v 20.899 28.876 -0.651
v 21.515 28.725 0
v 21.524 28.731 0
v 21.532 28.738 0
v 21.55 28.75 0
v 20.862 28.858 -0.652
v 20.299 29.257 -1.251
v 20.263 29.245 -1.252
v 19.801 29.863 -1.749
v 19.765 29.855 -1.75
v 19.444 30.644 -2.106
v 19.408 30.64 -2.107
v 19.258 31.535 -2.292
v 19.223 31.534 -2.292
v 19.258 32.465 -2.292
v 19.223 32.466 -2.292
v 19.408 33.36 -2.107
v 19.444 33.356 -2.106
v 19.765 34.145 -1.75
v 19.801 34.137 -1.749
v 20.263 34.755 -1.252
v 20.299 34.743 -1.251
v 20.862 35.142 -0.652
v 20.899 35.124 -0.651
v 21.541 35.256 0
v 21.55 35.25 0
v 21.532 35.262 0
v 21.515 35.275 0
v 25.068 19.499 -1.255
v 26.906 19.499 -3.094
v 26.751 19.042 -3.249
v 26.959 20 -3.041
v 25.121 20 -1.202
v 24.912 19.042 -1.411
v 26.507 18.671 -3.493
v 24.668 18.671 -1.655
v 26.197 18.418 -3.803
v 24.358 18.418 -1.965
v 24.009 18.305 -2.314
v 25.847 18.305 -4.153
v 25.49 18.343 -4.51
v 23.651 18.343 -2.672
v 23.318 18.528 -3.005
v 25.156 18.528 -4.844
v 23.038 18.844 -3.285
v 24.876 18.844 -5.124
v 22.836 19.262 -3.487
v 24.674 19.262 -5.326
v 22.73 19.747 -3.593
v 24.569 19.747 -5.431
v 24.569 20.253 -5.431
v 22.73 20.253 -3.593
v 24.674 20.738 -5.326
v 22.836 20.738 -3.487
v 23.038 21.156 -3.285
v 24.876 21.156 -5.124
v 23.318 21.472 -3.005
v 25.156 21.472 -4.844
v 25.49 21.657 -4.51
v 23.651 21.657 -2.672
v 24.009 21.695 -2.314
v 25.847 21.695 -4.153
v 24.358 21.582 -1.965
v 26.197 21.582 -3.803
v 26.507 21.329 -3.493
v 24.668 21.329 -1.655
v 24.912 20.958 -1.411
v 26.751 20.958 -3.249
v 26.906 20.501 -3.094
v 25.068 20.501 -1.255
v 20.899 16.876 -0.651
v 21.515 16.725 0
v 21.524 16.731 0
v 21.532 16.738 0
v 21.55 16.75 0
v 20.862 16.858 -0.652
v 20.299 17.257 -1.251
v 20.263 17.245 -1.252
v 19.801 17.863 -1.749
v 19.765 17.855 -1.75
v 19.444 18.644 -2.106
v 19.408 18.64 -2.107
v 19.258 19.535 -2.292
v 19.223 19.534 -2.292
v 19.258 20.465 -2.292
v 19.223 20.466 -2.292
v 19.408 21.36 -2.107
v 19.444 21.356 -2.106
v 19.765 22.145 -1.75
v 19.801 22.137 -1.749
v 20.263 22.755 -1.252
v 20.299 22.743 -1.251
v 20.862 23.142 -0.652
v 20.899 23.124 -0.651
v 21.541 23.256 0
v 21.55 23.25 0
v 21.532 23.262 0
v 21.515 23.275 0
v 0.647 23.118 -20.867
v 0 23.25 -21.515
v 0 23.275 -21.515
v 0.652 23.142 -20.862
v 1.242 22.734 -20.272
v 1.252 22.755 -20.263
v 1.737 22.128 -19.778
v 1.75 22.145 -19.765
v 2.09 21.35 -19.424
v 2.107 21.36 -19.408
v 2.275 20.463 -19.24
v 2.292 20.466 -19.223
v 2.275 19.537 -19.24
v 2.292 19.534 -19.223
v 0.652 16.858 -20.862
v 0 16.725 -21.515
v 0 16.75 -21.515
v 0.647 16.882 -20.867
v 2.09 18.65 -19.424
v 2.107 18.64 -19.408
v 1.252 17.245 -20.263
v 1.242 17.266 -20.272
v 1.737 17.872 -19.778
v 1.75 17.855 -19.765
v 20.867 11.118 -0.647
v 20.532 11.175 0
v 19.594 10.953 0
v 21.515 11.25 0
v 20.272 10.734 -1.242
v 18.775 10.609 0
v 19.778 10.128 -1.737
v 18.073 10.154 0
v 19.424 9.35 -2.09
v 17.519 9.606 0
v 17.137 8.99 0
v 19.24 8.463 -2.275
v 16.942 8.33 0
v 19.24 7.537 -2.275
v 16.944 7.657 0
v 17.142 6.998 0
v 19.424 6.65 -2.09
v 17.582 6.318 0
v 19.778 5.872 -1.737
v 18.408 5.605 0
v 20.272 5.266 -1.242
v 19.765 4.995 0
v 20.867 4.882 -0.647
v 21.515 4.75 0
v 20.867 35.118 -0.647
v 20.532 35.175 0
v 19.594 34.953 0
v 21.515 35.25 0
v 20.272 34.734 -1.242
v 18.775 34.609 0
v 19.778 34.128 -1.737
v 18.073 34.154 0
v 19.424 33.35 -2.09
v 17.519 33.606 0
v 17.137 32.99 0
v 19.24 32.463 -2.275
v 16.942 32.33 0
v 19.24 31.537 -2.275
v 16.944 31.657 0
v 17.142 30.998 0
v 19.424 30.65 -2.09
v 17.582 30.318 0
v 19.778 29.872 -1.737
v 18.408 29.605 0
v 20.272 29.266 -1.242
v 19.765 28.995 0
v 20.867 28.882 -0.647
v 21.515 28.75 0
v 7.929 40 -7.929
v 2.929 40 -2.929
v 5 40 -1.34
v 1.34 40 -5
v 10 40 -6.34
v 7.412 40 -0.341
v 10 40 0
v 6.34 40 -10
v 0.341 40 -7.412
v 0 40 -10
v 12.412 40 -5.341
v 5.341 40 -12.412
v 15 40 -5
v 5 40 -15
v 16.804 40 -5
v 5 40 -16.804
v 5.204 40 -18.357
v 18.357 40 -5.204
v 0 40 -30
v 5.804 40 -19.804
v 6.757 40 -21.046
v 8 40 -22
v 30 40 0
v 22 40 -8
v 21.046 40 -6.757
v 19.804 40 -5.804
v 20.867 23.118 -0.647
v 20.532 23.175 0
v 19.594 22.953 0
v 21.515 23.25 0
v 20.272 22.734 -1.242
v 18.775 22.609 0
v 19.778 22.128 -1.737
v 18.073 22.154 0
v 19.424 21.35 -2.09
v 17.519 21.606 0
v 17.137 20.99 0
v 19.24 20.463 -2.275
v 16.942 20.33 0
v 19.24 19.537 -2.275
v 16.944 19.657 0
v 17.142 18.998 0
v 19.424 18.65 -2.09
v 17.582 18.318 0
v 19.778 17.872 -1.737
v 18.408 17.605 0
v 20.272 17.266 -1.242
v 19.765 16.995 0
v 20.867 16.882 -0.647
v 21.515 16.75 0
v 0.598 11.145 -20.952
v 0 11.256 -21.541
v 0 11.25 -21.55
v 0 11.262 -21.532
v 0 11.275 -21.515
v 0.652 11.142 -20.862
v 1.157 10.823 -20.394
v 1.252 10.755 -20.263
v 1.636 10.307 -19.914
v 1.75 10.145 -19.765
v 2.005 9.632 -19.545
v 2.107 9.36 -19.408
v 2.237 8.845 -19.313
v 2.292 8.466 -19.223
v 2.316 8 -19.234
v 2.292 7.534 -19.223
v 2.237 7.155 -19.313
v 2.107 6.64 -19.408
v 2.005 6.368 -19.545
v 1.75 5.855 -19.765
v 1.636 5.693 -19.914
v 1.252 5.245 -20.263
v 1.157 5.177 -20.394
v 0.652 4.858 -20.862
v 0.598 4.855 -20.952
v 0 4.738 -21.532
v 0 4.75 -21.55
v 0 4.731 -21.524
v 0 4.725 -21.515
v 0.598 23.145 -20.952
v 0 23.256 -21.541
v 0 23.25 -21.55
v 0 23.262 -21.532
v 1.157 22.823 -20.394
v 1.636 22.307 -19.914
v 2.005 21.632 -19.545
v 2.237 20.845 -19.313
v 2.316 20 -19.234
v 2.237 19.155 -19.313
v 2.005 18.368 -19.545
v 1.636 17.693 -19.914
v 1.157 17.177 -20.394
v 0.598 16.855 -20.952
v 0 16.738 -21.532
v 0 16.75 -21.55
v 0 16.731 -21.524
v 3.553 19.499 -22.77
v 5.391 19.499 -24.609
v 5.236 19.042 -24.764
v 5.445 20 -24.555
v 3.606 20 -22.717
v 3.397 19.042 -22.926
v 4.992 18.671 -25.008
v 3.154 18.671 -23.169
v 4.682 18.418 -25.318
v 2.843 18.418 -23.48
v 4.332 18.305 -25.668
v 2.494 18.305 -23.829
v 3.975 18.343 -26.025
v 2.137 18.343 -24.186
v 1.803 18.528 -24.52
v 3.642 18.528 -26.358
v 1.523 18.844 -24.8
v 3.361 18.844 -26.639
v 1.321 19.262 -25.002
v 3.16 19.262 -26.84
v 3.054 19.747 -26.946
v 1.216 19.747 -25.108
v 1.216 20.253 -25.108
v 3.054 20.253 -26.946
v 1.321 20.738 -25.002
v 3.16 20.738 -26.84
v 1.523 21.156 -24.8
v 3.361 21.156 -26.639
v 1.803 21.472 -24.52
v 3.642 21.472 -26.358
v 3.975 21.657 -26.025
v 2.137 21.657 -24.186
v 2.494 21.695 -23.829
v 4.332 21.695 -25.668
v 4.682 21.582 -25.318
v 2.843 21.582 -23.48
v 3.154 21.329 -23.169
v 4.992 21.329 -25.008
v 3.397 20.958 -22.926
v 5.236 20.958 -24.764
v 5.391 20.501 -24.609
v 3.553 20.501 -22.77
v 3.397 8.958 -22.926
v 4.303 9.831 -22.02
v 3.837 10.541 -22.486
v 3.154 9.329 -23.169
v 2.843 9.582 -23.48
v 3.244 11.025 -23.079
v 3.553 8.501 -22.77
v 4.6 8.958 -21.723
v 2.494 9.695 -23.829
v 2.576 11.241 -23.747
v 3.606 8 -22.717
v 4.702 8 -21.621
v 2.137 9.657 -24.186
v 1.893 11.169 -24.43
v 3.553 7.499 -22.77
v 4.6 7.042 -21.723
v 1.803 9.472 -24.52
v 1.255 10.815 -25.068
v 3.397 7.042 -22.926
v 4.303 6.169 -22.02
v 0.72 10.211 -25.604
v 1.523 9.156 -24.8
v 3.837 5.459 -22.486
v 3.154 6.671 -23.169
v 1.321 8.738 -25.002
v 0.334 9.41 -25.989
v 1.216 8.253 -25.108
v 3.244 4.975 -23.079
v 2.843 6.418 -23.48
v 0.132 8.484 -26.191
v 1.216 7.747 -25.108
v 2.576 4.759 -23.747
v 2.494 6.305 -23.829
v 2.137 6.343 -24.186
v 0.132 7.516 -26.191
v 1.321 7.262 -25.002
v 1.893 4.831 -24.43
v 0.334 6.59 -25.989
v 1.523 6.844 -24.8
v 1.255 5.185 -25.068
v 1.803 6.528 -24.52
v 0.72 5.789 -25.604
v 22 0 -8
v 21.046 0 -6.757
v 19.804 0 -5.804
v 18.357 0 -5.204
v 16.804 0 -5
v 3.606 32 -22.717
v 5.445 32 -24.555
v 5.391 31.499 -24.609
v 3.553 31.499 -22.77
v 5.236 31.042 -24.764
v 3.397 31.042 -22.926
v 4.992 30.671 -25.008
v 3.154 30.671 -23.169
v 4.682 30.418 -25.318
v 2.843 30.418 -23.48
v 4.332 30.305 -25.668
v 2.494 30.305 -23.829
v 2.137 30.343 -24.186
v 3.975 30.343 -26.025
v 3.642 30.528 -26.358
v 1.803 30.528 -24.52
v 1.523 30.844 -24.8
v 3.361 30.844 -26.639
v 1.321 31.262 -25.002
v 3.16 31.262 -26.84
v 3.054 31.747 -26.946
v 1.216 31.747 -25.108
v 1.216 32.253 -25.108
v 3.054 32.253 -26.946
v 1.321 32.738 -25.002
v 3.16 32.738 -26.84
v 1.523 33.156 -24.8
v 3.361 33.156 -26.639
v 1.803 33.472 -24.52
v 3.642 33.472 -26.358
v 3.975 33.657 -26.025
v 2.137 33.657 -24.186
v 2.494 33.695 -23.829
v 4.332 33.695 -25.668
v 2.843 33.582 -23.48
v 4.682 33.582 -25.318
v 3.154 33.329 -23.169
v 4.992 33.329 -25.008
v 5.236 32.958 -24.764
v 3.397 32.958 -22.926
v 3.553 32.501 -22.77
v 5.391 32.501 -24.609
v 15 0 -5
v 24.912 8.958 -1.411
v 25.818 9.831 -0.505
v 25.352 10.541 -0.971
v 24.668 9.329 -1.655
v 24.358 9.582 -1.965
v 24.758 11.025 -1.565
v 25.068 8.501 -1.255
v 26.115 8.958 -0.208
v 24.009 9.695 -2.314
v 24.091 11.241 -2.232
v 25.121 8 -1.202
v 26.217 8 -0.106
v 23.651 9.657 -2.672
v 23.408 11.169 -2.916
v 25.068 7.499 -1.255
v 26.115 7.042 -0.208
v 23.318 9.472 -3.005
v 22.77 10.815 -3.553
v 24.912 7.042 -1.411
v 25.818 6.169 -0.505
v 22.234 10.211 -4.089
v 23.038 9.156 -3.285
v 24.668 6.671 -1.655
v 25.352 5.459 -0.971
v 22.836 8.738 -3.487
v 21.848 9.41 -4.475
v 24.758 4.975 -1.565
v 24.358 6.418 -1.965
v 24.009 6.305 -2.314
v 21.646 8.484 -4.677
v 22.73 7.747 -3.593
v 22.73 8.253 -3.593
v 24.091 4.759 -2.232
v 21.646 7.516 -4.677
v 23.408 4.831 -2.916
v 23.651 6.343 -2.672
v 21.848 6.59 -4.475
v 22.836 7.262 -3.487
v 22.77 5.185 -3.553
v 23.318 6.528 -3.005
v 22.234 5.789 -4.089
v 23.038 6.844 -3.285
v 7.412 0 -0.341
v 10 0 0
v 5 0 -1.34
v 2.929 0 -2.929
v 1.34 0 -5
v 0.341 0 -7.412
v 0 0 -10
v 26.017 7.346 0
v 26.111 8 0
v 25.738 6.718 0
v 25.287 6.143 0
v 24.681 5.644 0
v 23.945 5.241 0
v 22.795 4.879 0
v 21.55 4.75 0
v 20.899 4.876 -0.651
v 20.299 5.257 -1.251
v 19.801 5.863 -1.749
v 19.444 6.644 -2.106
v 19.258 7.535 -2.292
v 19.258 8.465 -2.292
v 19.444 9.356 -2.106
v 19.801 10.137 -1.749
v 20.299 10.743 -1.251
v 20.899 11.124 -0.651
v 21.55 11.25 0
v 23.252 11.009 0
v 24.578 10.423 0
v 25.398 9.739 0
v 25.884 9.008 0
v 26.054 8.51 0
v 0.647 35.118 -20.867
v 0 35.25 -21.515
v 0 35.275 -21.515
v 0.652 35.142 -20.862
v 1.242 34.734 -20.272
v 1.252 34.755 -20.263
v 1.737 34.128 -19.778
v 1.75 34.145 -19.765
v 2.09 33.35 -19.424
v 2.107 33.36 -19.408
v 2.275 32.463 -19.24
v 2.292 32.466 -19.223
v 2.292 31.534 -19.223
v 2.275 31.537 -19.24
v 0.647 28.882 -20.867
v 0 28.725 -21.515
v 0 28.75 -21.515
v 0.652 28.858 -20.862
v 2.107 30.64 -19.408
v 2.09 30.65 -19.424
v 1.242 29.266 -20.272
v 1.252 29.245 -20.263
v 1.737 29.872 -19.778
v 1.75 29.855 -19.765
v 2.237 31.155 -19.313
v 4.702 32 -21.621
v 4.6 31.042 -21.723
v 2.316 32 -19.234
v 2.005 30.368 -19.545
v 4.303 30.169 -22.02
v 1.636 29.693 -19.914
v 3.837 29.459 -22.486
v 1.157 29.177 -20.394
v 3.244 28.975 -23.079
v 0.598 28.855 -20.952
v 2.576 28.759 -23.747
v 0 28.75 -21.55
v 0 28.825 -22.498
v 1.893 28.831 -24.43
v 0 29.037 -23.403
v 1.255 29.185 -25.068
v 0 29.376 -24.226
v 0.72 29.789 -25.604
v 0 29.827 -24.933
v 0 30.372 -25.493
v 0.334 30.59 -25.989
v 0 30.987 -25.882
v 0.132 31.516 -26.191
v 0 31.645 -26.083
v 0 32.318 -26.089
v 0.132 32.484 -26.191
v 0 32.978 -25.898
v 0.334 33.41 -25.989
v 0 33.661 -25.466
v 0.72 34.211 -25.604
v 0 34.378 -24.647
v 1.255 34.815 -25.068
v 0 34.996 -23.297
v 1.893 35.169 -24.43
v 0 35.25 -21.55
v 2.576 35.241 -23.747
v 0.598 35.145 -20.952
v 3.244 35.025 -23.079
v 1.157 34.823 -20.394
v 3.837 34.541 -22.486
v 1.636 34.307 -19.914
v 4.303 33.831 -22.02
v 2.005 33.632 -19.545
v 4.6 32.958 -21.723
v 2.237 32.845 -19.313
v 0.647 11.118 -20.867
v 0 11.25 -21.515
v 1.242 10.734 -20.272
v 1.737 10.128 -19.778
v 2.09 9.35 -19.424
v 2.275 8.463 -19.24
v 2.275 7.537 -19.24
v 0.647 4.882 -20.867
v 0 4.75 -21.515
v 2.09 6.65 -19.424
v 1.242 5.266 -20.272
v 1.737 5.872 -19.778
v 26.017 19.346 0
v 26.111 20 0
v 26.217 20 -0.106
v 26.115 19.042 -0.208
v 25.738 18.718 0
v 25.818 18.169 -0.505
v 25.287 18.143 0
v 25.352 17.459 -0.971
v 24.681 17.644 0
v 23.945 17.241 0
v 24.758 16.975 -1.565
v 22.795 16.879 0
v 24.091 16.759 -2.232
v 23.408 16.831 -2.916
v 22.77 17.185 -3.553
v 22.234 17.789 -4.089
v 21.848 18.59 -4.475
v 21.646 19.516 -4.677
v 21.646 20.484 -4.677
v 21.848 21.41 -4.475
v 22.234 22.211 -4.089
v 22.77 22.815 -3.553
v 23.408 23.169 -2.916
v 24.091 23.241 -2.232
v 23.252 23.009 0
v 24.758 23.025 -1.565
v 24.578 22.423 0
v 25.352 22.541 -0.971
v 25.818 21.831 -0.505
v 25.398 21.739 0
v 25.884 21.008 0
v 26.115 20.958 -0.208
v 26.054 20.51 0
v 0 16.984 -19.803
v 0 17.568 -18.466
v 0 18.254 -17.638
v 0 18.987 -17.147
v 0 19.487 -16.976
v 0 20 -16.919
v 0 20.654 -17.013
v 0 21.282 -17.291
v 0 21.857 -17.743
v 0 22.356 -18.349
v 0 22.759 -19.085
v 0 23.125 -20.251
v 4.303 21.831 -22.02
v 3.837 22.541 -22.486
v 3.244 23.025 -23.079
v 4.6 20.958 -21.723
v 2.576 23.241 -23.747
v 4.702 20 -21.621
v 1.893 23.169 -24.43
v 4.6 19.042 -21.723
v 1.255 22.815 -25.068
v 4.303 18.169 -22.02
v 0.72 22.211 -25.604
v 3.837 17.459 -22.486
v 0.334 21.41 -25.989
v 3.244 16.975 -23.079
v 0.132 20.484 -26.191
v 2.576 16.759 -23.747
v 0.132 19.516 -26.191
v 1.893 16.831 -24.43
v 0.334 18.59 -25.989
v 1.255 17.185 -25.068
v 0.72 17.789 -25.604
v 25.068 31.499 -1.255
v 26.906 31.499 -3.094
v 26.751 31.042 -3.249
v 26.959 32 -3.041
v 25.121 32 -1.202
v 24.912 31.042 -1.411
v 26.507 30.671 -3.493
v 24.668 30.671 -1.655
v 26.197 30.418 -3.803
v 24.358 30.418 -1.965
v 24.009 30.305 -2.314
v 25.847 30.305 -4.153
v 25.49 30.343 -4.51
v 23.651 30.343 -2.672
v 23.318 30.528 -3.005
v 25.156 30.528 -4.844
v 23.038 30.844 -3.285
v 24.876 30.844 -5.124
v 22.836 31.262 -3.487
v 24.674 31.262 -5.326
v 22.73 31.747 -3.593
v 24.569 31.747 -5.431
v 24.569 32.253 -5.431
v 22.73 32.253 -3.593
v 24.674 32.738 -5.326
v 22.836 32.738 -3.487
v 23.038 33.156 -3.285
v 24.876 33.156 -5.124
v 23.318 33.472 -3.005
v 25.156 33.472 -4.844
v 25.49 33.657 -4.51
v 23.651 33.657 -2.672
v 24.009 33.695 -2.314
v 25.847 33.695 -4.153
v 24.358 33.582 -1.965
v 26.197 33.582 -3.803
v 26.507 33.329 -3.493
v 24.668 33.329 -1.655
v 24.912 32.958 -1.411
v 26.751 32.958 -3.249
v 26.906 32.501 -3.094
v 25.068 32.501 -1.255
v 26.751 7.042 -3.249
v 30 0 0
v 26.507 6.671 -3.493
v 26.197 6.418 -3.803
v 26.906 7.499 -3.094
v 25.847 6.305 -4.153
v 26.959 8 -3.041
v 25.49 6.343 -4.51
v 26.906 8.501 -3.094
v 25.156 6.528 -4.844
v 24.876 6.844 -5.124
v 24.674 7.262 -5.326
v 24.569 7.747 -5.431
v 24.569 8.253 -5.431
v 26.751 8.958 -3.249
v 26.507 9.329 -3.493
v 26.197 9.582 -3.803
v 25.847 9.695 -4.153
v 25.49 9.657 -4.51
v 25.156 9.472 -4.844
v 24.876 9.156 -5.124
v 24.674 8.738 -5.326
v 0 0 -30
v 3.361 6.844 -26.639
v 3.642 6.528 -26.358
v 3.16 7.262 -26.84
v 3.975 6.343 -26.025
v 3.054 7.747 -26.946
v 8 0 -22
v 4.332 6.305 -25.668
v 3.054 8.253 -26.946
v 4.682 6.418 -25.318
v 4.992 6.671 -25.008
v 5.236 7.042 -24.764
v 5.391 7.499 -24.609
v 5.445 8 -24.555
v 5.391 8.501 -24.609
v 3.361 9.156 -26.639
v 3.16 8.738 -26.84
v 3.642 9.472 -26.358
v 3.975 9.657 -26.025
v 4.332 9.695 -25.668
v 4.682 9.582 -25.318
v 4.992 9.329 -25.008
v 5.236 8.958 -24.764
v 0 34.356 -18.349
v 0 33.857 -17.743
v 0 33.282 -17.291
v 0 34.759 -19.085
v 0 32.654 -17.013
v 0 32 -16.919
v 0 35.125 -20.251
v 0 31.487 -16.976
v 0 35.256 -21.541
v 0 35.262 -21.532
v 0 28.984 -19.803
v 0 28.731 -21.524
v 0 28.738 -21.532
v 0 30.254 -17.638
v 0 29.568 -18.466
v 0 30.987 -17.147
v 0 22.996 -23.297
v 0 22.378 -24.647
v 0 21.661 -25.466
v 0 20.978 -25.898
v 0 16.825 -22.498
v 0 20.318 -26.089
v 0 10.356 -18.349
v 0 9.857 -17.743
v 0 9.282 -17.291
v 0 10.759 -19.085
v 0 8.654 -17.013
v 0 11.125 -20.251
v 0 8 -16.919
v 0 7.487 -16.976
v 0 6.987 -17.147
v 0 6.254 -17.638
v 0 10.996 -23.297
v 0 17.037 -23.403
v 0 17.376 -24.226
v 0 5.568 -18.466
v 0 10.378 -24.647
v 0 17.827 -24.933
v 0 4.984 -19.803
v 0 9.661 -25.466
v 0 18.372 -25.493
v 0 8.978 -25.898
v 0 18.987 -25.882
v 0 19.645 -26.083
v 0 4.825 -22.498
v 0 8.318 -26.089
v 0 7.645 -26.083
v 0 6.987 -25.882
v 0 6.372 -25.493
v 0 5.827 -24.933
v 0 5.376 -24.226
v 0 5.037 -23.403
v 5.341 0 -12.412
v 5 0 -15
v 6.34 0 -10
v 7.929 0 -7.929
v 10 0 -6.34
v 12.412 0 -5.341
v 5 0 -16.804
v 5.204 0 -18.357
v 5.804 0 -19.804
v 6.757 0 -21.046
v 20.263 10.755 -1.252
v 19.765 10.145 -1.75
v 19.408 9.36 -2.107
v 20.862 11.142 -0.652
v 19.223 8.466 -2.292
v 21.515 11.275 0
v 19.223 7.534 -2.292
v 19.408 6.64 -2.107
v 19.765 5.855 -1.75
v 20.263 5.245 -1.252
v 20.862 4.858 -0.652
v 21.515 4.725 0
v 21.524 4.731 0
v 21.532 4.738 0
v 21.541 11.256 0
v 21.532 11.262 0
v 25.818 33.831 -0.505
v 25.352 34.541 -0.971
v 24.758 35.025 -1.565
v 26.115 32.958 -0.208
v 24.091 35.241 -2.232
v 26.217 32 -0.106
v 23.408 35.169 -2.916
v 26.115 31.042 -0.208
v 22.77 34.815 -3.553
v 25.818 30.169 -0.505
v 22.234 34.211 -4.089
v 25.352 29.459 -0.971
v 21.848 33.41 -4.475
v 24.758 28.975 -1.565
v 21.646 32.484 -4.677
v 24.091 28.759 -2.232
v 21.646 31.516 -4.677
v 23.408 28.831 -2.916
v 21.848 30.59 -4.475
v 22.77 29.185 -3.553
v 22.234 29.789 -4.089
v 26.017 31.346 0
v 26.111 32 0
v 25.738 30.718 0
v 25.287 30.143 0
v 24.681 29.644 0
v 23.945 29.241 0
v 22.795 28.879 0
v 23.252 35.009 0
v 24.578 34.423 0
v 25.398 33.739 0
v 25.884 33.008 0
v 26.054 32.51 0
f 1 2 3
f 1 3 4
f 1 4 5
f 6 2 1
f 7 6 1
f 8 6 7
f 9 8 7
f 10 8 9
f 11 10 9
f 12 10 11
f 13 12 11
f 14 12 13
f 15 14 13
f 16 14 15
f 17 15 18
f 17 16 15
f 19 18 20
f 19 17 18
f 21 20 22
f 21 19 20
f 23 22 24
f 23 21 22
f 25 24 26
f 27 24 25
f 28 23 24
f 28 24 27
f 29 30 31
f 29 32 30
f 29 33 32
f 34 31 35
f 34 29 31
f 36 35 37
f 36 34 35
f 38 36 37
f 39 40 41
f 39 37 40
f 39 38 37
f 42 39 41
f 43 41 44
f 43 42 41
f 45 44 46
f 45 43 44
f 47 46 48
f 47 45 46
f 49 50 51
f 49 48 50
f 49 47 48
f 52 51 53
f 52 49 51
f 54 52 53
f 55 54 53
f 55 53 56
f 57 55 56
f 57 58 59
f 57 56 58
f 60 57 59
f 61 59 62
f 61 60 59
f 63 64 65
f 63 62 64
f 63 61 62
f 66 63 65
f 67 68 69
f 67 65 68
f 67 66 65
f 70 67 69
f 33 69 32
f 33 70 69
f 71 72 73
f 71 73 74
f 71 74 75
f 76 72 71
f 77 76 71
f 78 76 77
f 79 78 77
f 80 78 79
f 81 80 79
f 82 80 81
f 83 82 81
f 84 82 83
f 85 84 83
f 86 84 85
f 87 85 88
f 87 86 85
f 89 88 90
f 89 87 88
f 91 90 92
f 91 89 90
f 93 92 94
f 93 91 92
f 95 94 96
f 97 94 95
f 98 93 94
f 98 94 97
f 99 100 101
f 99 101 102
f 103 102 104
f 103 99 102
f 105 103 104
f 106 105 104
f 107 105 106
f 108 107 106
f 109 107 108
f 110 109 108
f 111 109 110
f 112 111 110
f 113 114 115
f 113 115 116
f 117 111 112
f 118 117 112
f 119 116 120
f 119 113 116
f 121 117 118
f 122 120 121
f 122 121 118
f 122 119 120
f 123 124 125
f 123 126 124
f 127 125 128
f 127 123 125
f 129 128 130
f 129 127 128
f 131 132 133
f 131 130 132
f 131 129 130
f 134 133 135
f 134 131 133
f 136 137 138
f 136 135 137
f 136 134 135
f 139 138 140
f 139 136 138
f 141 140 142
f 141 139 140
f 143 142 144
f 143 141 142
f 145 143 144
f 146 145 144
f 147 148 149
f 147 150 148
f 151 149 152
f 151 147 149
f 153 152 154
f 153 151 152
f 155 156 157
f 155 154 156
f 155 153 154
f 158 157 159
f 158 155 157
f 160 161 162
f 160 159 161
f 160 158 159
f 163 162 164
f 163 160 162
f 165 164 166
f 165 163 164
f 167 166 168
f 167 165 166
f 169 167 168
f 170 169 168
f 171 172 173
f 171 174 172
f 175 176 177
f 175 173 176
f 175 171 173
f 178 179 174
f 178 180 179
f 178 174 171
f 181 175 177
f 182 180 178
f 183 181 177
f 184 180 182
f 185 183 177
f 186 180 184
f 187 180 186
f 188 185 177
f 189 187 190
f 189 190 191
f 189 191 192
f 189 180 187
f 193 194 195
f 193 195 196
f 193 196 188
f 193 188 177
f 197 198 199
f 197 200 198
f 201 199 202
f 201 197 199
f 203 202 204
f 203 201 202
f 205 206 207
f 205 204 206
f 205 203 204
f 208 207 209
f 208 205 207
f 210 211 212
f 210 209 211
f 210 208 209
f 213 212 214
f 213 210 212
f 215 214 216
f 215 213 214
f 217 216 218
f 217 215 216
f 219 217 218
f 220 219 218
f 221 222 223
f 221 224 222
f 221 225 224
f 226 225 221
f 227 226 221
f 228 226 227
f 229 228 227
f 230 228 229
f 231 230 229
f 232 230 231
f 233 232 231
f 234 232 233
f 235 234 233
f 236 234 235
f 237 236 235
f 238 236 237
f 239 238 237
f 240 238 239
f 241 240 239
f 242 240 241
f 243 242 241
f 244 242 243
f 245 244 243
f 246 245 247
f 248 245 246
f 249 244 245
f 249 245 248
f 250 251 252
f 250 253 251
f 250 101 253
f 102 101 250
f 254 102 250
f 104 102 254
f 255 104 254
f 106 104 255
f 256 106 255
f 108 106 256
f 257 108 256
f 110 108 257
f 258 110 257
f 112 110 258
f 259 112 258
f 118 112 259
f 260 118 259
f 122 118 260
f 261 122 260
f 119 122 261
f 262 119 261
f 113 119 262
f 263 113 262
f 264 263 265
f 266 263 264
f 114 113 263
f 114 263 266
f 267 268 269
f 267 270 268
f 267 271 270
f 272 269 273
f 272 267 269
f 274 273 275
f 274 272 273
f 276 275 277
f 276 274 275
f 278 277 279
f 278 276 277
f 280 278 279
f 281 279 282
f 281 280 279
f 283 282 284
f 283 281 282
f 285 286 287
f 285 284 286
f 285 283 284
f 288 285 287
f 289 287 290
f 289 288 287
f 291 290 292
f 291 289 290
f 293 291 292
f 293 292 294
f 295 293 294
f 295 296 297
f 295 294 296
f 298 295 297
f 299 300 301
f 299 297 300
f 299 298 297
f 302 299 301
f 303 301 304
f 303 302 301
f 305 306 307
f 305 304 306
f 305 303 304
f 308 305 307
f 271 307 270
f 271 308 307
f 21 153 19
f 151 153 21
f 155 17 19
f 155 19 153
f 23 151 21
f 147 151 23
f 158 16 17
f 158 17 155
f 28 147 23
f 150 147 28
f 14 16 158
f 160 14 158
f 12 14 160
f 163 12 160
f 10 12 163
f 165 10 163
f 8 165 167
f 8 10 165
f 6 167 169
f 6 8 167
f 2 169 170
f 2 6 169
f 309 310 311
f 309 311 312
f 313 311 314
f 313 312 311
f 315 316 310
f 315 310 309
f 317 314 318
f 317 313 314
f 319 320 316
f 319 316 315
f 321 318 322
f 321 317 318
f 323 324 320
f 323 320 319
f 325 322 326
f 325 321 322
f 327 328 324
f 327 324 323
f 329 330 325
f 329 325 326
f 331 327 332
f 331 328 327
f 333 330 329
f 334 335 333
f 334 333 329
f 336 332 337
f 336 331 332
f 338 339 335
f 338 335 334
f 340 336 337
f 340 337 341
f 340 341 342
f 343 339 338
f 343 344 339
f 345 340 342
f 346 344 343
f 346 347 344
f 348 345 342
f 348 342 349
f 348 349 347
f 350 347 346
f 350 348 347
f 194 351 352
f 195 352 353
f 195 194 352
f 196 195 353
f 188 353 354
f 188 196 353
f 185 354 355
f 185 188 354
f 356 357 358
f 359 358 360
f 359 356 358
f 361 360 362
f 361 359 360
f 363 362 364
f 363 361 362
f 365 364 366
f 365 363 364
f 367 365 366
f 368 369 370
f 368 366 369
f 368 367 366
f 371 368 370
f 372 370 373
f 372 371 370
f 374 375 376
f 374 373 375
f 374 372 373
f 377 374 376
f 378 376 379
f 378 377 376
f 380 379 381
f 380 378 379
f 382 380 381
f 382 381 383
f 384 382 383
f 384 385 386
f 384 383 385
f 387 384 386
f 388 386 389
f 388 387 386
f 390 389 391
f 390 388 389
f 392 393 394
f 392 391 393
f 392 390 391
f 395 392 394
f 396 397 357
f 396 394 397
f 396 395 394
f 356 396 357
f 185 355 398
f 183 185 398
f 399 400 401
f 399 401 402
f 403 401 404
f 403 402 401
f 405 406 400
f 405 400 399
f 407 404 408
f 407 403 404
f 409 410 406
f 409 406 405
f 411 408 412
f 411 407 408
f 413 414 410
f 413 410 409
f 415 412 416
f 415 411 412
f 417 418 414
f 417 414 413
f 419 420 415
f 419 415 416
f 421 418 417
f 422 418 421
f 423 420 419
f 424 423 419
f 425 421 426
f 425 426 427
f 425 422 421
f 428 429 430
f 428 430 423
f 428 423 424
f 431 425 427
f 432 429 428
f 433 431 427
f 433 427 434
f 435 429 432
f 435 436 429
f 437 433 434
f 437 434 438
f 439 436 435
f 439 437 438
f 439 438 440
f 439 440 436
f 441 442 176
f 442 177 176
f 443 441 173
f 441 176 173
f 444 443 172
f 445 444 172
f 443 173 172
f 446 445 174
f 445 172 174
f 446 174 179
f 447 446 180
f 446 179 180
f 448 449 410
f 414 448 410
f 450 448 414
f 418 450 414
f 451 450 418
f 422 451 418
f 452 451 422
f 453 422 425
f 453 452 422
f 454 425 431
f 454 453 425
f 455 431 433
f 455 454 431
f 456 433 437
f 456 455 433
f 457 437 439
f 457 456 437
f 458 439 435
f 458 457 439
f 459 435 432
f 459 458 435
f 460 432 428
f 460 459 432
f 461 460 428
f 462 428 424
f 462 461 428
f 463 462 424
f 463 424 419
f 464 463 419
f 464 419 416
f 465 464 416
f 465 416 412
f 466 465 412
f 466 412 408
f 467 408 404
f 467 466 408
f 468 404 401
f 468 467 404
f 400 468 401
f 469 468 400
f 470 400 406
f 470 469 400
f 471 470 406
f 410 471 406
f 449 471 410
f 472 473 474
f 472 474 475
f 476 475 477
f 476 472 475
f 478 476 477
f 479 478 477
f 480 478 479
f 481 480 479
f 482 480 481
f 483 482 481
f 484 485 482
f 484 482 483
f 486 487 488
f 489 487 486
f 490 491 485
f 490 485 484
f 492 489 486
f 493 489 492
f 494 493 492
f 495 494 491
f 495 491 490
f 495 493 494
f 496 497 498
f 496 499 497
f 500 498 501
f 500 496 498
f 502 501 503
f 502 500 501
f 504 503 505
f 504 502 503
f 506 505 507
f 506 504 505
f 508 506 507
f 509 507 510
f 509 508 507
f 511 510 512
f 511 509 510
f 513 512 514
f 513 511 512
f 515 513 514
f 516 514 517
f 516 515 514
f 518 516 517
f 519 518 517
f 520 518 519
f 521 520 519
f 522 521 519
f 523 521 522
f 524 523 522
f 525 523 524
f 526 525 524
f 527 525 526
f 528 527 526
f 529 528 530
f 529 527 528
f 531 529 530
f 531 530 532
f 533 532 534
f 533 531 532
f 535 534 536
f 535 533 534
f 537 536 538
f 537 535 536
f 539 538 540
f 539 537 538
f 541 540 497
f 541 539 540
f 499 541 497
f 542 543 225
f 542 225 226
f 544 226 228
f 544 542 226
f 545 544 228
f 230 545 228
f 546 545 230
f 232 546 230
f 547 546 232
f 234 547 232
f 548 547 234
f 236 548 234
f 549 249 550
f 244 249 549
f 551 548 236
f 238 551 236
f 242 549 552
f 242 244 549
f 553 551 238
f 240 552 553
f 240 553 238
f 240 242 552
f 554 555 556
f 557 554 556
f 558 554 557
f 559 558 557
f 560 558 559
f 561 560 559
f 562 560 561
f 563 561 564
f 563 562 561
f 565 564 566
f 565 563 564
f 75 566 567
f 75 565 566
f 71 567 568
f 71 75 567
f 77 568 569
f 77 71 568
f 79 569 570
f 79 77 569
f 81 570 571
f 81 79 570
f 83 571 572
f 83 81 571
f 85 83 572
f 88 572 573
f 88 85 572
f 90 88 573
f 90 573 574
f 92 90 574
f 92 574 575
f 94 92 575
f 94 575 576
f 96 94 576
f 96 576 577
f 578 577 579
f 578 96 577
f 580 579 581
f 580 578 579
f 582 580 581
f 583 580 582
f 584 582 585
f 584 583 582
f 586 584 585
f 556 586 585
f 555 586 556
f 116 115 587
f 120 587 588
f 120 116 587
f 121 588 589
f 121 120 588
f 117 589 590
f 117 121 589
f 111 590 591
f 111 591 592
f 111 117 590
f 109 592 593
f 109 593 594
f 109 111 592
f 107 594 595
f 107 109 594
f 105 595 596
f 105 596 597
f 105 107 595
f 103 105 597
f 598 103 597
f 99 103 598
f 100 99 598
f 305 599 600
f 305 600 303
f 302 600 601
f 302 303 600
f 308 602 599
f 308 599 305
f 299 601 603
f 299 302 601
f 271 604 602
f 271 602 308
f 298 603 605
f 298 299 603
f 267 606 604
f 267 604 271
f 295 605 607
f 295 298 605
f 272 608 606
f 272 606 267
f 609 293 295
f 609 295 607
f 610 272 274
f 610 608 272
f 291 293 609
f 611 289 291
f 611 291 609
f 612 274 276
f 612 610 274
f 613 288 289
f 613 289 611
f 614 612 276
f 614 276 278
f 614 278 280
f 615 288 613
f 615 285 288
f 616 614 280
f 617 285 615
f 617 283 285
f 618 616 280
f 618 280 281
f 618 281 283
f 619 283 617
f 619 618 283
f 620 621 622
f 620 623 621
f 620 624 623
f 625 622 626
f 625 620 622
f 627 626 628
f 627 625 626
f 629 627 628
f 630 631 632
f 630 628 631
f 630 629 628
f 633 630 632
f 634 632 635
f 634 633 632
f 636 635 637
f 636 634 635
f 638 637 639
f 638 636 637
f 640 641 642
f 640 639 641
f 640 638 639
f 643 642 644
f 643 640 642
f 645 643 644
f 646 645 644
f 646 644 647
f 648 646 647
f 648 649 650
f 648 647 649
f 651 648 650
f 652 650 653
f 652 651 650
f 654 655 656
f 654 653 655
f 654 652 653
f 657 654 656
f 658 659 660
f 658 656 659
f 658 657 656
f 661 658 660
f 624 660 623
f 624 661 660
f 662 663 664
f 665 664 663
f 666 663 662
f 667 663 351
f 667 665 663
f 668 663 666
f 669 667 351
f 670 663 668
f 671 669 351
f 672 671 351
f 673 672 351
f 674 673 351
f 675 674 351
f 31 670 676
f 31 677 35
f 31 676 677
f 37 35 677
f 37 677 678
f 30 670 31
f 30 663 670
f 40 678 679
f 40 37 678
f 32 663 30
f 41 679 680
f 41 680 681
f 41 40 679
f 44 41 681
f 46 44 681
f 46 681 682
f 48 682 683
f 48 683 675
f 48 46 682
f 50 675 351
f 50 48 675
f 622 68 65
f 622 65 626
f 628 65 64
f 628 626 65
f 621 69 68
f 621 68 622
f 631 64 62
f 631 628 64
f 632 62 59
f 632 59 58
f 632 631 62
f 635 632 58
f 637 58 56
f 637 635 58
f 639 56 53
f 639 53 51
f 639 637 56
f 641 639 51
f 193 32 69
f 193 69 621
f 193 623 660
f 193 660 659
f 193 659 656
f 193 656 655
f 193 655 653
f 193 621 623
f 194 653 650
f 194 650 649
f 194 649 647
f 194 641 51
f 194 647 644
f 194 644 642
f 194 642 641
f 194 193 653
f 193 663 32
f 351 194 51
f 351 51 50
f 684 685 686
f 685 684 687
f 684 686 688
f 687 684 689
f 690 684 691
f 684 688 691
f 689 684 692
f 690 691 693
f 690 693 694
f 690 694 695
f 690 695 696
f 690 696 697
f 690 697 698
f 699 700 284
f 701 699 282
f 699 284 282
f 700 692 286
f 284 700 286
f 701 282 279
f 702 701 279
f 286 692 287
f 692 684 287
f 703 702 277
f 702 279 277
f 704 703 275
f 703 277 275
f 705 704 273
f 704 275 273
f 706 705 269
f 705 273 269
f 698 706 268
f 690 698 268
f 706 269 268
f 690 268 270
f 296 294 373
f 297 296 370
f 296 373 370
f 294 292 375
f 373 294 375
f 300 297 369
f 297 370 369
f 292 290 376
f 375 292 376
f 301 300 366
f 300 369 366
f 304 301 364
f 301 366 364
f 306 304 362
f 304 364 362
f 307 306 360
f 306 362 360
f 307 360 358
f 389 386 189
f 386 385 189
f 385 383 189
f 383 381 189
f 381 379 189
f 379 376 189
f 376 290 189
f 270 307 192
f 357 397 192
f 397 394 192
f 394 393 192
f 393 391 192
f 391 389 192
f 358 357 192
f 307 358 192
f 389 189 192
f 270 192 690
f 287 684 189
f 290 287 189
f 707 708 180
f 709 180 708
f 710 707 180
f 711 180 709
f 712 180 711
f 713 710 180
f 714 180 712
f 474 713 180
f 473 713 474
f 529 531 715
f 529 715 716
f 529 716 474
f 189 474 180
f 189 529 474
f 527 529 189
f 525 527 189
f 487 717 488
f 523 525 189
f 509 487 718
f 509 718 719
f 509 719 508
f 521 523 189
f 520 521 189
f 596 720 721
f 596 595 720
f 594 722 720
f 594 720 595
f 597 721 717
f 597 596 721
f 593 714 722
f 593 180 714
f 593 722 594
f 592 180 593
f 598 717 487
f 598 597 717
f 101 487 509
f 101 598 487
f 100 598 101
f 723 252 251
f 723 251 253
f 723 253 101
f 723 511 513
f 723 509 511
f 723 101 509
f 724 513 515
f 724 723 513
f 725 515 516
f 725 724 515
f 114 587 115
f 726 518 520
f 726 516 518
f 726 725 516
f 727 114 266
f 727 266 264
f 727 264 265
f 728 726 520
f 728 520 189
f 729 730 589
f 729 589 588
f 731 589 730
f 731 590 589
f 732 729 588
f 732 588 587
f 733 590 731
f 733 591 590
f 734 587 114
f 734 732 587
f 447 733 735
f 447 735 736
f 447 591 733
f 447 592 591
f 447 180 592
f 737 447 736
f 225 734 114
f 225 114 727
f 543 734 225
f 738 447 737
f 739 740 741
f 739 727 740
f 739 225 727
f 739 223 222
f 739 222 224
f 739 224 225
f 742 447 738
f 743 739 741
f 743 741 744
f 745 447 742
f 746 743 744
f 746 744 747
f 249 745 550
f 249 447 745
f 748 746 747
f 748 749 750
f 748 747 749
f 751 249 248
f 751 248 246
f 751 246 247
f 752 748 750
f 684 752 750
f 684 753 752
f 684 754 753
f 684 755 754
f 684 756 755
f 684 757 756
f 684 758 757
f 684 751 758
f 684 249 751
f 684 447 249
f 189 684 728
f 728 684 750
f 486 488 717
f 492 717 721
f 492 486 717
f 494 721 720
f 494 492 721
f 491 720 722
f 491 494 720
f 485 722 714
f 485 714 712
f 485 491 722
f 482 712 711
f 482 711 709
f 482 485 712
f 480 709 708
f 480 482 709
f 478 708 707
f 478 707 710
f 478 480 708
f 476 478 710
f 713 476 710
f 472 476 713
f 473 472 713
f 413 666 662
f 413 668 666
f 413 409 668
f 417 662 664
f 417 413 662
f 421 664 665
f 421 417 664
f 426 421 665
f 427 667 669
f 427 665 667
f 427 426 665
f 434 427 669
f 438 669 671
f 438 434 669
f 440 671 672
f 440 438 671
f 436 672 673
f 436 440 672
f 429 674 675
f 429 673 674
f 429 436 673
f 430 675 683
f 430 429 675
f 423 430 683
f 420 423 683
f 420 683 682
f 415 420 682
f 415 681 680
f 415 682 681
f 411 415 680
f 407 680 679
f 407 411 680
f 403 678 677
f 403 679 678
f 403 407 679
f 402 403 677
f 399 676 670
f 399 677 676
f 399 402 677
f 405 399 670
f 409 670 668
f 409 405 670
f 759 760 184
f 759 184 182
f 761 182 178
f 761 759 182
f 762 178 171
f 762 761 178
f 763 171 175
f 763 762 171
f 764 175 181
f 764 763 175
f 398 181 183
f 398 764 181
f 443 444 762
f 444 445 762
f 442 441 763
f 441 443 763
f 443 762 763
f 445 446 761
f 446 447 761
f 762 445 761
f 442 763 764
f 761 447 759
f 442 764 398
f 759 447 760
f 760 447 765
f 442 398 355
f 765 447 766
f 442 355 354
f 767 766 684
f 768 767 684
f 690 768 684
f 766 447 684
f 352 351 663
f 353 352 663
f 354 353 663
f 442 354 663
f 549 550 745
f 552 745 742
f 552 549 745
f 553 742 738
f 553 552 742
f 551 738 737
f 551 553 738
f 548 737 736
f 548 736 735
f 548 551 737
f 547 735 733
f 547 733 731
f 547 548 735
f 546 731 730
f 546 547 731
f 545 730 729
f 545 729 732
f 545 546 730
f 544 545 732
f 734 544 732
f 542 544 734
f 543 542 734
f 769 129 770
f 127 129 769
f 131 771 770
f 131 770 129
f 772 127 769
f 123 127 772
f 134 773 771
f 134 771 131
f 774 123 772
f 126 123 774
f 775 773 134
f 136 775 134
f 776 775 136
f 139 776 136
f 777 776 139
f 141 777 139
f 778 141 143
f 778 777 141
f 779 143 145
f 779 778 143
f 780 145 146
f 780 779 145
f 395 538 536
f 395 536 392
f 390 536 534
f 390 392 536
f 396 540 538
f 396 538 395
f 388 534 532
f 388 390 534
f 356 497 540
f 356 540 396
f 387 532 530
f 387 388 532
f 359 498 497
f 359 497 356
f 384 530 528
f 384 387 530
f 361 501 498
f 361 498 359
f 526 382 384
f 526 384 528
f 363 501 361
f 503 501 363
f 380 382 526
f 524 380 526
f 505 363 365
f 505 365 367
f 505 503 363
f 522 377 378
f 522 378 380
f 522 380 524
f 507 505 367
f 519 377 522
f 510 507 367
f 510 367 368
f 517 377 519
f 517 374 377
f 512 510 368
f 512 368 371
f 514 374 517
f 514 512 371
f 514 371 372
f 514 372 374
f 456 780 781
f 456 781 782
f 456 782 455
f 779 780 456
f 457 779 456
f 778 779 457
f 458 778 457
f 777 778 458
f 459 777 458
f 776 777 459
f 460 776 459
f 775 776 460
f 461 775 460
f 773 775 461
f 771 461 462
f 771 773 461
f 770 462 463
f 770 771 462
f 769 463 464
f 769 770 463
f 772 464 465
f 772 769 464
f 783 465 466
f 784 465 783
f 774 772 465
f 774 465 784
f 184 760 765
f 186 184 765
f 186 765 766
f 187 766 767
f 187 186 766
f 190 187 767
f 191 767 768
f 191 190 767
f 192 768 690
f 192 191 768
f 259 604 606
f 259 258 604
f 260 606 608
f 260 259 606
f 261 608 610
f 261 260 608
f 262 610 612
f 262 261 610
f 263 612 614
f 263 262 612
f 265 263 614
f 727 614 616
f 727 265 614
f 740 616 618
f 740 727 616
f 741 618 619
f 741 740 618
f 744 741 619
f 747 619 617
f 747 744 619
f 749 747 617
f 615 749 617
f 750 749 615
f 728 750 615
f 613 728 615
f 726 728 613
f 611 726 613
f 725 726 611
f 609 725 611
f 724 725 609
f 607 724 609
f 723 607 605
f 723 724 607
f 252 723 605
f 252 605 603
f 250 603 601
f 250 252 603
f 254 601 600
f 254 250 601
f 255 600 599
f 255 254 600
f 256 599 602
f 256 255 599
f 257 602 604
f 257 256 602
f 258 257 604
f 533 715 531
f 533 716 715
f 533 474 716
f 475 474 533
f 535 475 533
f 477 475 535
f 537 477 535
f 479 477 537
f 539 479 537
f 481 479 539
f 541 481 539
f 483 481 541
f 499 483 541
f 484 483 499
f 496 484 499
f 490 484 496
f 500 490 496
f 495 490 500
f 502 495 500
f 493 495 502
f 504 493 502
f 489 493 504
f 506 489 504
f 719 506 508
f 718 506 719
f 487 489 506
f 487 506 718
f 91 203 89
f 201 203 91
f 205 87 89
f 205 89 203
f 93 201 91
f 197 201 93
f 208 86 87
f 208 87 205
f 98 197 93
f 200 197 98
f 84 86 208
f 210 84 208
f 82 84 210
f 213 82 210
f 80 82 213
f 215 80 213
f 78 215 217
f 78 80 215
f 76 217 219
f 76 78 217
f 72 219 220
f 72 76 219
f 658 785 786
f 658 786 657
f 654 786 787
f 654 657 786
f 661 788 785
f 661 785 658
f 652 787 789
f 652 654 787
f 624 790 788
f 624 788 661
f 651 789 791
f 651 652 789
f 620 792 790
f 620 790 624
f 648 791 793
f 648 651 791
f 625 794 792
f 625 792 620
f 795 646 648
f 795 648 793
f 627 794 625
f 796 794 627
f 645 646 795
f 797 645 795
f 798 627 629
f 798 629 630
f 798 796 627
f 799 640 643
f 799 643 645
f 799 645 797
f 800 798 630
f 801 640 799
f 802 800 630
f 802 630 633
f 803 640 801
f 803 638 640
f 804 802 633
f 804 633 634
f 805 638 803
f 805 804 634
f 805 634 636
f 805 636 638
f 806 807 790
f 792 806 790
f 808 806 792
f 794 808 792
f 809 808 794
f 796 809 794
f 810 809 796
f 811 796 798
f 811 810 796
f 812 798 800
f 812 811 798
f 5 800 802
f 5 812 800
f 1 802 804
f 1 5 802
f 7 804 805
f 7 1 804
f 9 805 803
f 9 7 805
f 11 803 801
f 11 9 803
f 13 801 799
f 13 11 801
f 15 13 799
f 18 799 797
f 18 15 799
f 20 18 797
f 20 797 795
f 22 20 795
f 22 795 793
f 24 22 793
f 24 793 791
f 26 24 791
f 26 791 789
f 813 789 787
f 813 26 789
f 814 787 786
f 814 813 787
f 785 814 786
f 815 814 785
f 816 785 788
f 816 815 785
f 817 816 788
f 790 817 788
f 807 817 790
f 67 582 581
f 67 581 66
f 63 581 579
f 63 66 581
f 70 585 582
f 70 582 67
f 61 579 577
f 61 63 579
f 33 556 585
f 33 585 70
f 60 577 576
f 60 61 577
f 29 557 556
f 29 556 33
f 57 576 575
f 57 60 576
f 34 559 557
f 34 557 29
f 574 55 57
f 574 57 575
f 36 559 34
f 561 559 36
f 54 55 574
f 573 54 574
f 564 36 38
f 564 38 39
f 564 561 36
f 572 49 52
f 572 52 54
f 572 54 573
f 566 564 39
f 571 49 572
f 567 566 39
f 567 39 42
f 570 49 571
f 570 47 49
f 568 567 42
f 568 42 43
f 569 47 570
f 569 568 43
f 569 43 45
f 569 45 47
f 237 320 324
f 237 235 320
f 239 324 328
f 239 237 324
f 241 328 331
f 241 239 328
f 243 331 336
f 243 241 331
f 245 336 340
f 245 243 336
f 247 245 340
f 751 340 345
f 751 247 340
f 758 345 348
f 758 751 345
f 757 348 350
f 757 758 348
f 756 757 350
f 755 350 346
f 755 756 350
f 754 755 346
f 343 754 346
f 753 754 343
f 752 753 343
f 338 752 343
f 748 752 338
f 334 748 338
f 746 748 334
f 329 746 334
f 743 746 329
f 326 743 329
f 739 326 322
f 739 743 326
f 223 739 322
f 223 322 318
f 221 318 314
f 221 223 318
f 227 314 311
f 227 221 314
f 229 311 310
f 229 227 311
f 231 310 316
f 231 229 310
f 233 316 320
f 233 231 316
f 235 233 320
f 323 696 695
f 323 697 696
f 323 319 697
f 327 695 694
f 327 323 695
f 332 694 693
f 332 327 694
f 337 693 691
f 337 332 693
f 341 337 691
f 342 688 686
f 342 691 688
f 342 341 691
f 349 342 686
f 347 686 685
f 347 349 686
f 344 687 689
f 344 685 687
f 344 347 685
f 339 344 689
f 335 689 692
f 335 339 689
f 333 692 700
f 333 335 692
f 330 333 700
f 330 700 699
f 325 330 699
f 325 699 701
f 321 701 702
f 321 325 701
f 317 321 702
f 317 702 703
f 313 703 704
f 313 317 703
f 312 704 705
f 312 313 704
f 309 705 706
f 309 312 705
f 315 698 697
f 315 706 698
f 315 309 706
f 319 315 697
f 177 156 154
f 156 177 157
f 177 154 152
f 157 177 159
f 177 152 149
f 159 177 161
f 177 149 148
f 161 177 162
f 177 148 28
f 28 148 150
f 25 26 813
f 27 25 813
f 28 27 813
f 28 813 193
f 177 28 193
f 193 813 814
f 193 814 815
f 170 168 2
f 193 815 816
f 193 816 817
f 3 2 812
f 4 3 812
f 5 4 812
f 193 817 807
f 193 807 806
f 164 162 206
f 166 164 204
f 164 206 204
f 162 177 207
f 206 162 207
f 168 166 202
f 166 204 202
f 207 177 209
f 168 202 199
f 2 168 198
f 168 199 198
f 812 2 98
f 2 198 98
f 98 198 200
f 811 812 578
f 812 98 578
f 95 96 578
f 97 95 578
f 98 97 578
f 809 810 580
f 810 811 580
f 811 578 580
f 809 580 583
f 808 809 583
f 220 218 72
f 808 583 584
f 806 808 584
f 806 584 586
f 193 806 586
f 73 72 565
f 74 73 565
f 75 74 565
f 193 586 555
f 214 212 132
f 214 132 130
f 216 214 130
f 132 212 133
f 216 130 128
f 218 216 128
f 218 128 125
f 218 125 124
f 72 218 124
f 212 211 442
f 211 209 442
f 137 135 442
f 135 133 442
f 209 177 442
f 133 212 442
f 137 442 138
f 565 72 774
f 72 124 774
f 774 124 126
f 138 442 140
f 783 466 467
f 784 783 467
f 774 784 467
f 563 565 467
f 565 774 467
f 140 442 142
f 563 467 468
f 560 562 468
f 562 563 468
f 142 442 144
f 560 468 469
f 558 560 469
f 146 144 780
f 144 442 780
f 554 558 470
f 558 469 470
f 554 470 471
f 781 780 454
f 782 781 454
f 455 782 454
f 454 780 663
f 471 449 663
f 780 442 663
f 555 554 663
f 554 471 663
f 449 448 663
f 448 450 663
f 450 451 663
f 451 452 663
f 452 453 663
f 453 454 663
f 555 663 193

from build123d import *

# Parameters (mm, degrees)
SKETCH1_W                                    = 30
SKETCH1_H                                    = 30
SKETCH1_R                                    = 10
BOSS_EXTRUDE1_DEPTH                          = 40
CUT_EXTRUDE1_DEPTH                           = 59.309518948
CUT_EXTRUDE2_DEPTH                           = 59.309518948
BOSS_EXTRUDE2_DEPTH                          = 40
FILLET1_R                                    = 6
M3_CLEARANCE_HOLE1_D                         = 3.2
M3_CLEARANCE_HOLE1_CSINK_D                   = 3.25
M3_CLEARANCE_HOLE1_CSINK_ANGLE               = 90
CBORE_FOR_M3_HEX_SOCKET_HEAD_CAP_SCR_2_COUNT = 2
CBORE_FOR_M3_HEX_SOCKET_HEAD_CAP_SCR_2_PITCH = 12
CBORE_FOR_M3_HEX_SOCKET_HEAD_CAP_SCR_3_COUNT = 2
CBORE_FOR_M3_HEX_SOCKET_HEAD_CAP_SCR_3_PITCH = 24
CBORE_FOR_M3_HEX_SOCKET_HEAD_CAP_SCR_4_COUNT = 2
CBORE_FOR_M3_HEX_SOCKET_HEAD_CAP_SCR_4_PITCH = 30.426406871
CBORE_FOR_M3_HEX_SOCKET_HEAD_CAP_SCR_5_COUNT = 2
CBORE_FOR_M3_HEX_SOCKET_HEAD_CAP_SCR_5_PITCH = 32.707281072
CBORE_FOR_M3_HEX_SOCKET_HEAD_CAP_SCR_6_COUNT = 2
CBORE_FOR_M3_HEX_SOCKET_HEAD_CAP_SCR_6_PITCH = 38.752628751
SKETCH10_R                                   = 3.25
CUT_EXTRUDE3_DEPTH                           = 47.55178469
FILLET2_R                                    = 10


with BuildPart() as part:
    # Sketch1 → Boss-Extrude1 (new body)
    with BuildSketch(Plane(origin=(0, 0, 0), x_dir=(1, 0, 0), z_dir=(0, 1, 0))):
        with Locations((15, 15)):
            Rectangle(SKETCH1_W, SKETCH1_H)
        with Locations(Location((15, 15, 0), (0, 0, 270))):
            Circle(SKETCH1_R, mode=Mode.SUBTRACT)
    extrude(amount=BOSS_EXTRUDE1_DEPTH)

    # Sketch2 → Cut-Extrude1 (cut, through all)
    with BuildSketch(Plane(origin=(0, 40, 0), x_dir=(1, 0, 0), z_dir=(0, 1, 0))):
        with BuildLine():
            Line((5, 15), (5, 30))
            Line((5, 30), (30, 30))
            Line((30, 30), (30, 5))
            Line((30, 5), (15, 5))
            ThreePointArc((15, 5), (7.928932188, 7.928932188), (5, 15))
        make_face()
    extrude(amount=-CUT_EXTRUDE1_DEPTH, mode=Mode.SUBTRACT)

    # Sketch3 → Cut-Extrude2 (cut, through all)
    with BuildSketch(Plane(origin=(0, 40, 0), x_dir=(1, 0, 0), z_dir=(0, 1, 0))):
        Polygon((0, 30), (5, 25), (5, 30), align=None)
        Polygon((30, 0), (25, 5), (30, 5), align=None)
    extrude(amount=-CUT_EXTRUDE2_DEPTH, mode=Mode.SUBTRACT)

    # Sketch7 → Boss-Extrude2 (add)
    with BuildSketch(Plane(origin=(0, 40, 0), x_dir=(1, 0, 0), z_dir=(0, 1, 0))):
        Polygon((5, 25), (8, 22), (5, 22), align=None)
        Polygon((25, 5), (22, 8), (22, 5), align=None)
    extrude(amount=-BOSS_EXTRUDE2_DEPTH)

    # Fillet1
    # the kernel refuses this fillet: 6 mm, written as the material it adds along each edge
    with BuildSketch(Plane(origin=(5, 40, -22), x_dir=(1, 0, 0), z_dir=(0, -1, 0))) as fillet1_piece_1_section:
        with BuildLine():
            CenterArc((6, 5.196152423), FILLET1_R, 180, 60)
            Line((0, 5.196152423), (-0.12, 5.196152423))
            Line((-0.12, 5.196152423), (-0.12, 0))
            Line((-0.12, 0), (0, -0.12))
            ThreePointArc((0, -0.12), (1.5, -0.12), (2.94, -0.103923048))
            Line((2.94, -0.103923048), (3, 0))
        make_face()
    fillet1_piece_1 = extrude(amount=40, mode=Mode.PRIVATE)
    fillet1_piece_1 = split(fillet1_piece_1, bisect_by=Plane(origin=(7.537314478, 20, -22.462685522), z_dir=(-0.7071067811865479, 0, 0.7071067811865474)), keep=Keep.TOP, mode=Mode.PRIVATE)
    add(fillet1_piece_1)
    with BuildSketch(Plane(origin=(22, 40, -5), x_dir=(-1, 0, 0), z_dir=(0, -1, 0))) as fillet1_piece_2_section:
        with BuildLine():
            CenterArc((5.196152423, 6), FILLET1_R, 210, 60)
            Line((0, 3), (-0.103923048, 2.94))
            ThreePointArc((-0.103923048, 2.94), (-0.12, 1.5), (-0.12, 0))
            Line((-0.12, 0), (0, -0.12))
            Line((0, -0.12), (5.196152423, -0.12))
            Line((5.196152423, -0.12), (5.196152423, 0))
        make_face()
    fillet1_piece_2 = extrude(amount=40, mode=Mode.PRIVATE)
    fillet1_piece_2 = split(fillet1_piece_2, bisect_by=Plane(origin=(22.462685522, 20, -7.537314478), z_dir=(-0.7071067811865436, 0, 0.7071067811865516)), keep=Keep.TOP, mode=Mode.PRIVATE)
    add(fillet1_piece_2)

    # M3 Clearance Hole1 (through all)
    with Locations(Plane(origin=(15, 0, -15), x_dir=(-0.7071067811865475, 0, -0.7071067811865476), z_dir=(0.7071067811865476, 0, -0.7071067811865475))):
        with Locations((-15.213203436, 32), (15.213203436, 32), (15.213203436, 20), (15.213203436, 8), (-15.213203436, 8), (-15.213203436, 20)):
            CounterSinkHole(M3_CLEARANCE_HOLE1_D / 2, M3_CLEARANCE_HOLE1_CSINK_D / 2, counter_sink_angle=M3_CLEARANCE_HOLE1_CSINK_ANGLE)

    # Sketch9 → CBORE for M3 Hex Socket Head Cap Screw1 (revolve, cut)
    with BuildSketch(Plane(origin=(21.514718626, 32, 0), x_dir=(0.7071067811865515, 0, 0.7071067811865436), z_dir=(0, 1, 0))):
        Polygon((0, 0), (0, 27.213203436), (1.7, 27.213203436), (1.7, 3.4), (3.25, 3.4), (3.25, 0.025), (3.275, 0), align=None)
    cbore_for_m3_hex_socket_head_cap_screw1 = revolve(axis=Axis((17.024590565, 32, 4.490128061), (0.7071067811865436, 0, -0.7071067811865515)), mode=Mode.SUBTRACT)

    # CBORE for M3 Hex Socket Head Cap Scr 2: CBORE for M3 Hex Socket Head Cap Screw1 ×2
    with Locations(*[(0, -i * CBORE_FOR_M3_HEX_SOCKET_HEAD_CAP_SCR_2_PITCH, 0) for i in range(1, CBORE_FOR_M3_HEX_SOCKET_HEAD_CAP_SCR_2_COUNT)]):
        add(cbore_for_m3_hex_socket_head_cap_screw1, mode=Mode.SUBTRACT)

    # CBORE for M3 Hex Socket Head Cap Scr 3: CBORE for M3 Hex Socket Head Cap Screw1 ×2
    with Locations(*[(0, -i * CBORE_FOR_M3_HEX_SOCKET_HEAD_CAP_SCR_3_PITCH, 0) for i in range(1, CBORE_FOR_M3_HEX_SOCKET_HEAD_CAP_SCR_3_COUNT)]):
        add(cbore_for_m3_hex_socket_head_cap_screw1, mode=Mode.SUBTRACT)

    # CBORE for M3 Hex Socket Head Cap Scr 4: CBORE for M3 Hex Socket Head Cap Screw1 ×2
    with Locations(*[Vector(-0.7071067811865515, 0, -0.7071067811865437) * (i * CBORE_FOR_M3_HEX_SOCKET_HEAD_CAP_SCR_4_PITCH) for i in range(1, CBORE_FOR_M3_HEX_SOCKET_HEAD_CAP_SCR_4_COUNT)]):
        add(cbore_for_m3_hex_socket_head_cap_screw1, mode=Mode.SUBTRACT)

    # CBORE for M3 Hex Socket Head Cap Scr 5: CBORE for M3 Hex Socket Head Cap Screw1 ×2
    with Locations(*[Vector(-0.6577959989617107, -0.3668907841578198, -0.6577959989617034) * (i * CBORE_FOR_M3_HEX_SOCKET_HEAD_CAP_SCR_5_PITCH) for i in range(1, CBORE_FOR_M3_HEX_SOCKET_HEAD_CAP_SCR_5_COUNT)]):
        add(cbore_for_m3_hex_socket_head_cap_screw1, mode=Mode.SUBTRACT)

    # CBORE for M3 Hex Socket Head Cap Scr 6: CBORE for M3 Hex Socket Head Cap Screw1 ×2
    with Locations(*[Vector(-0.5551808824158828, -0.6193128253151639, -0.5551808824158766) * (i * CBORE_FOR_M3_HEX_SOCKET_HEAD_CAP_SCR_6_PITCH) for i in range(1, CBORE_FOR_M3_HEX_SOCKET_HEAD_CAP_SCR_6_COUNT)]):
        add(cbore_for_m3_hex_socket_head_cap_screw1, mode=Mode.SUBTRACT)

    # Sketch10 → Cut-Extrude3 (cut, through all)
    with BuildSketch(Plane(origin=(13.161522369, 0, -13.161522369), x_dir=(0.7071067811865515, 0, 0.7071067811865436), z_dir=(-0.7071067811865436, 0, 0.7071067811865515))):
        with Locations((-15.213203436, 8)):
            Circle(SKETCH10_R)
        with Locations((-15.213203436, 20)):
            Circle(SKETCH10_R)
        with Locations((-15.213203436, 32)):
            Circle(SKETCH10_R)
        with Locations((15.213203436, 32)):
            Circle(SKETCH10_R)
        with Locations((15.213203436, 20)):
            Circle(SKETCH10_R)
        with Locations((15.213203436, 8)):
            Circle(SKETCH10_R)
    extrude(amount=CUT_EXTRUDE3_DEPTH, mode=Mode.SUBTRACT)

    # Fillet2
    fillet2_edges = [part.edges().sort_by_distance(p)[0] for p in [
        (0, 20, 0),
    ]]
    fillet(fillet2_edges, radius=FILLET2_R)


solid = part.part
